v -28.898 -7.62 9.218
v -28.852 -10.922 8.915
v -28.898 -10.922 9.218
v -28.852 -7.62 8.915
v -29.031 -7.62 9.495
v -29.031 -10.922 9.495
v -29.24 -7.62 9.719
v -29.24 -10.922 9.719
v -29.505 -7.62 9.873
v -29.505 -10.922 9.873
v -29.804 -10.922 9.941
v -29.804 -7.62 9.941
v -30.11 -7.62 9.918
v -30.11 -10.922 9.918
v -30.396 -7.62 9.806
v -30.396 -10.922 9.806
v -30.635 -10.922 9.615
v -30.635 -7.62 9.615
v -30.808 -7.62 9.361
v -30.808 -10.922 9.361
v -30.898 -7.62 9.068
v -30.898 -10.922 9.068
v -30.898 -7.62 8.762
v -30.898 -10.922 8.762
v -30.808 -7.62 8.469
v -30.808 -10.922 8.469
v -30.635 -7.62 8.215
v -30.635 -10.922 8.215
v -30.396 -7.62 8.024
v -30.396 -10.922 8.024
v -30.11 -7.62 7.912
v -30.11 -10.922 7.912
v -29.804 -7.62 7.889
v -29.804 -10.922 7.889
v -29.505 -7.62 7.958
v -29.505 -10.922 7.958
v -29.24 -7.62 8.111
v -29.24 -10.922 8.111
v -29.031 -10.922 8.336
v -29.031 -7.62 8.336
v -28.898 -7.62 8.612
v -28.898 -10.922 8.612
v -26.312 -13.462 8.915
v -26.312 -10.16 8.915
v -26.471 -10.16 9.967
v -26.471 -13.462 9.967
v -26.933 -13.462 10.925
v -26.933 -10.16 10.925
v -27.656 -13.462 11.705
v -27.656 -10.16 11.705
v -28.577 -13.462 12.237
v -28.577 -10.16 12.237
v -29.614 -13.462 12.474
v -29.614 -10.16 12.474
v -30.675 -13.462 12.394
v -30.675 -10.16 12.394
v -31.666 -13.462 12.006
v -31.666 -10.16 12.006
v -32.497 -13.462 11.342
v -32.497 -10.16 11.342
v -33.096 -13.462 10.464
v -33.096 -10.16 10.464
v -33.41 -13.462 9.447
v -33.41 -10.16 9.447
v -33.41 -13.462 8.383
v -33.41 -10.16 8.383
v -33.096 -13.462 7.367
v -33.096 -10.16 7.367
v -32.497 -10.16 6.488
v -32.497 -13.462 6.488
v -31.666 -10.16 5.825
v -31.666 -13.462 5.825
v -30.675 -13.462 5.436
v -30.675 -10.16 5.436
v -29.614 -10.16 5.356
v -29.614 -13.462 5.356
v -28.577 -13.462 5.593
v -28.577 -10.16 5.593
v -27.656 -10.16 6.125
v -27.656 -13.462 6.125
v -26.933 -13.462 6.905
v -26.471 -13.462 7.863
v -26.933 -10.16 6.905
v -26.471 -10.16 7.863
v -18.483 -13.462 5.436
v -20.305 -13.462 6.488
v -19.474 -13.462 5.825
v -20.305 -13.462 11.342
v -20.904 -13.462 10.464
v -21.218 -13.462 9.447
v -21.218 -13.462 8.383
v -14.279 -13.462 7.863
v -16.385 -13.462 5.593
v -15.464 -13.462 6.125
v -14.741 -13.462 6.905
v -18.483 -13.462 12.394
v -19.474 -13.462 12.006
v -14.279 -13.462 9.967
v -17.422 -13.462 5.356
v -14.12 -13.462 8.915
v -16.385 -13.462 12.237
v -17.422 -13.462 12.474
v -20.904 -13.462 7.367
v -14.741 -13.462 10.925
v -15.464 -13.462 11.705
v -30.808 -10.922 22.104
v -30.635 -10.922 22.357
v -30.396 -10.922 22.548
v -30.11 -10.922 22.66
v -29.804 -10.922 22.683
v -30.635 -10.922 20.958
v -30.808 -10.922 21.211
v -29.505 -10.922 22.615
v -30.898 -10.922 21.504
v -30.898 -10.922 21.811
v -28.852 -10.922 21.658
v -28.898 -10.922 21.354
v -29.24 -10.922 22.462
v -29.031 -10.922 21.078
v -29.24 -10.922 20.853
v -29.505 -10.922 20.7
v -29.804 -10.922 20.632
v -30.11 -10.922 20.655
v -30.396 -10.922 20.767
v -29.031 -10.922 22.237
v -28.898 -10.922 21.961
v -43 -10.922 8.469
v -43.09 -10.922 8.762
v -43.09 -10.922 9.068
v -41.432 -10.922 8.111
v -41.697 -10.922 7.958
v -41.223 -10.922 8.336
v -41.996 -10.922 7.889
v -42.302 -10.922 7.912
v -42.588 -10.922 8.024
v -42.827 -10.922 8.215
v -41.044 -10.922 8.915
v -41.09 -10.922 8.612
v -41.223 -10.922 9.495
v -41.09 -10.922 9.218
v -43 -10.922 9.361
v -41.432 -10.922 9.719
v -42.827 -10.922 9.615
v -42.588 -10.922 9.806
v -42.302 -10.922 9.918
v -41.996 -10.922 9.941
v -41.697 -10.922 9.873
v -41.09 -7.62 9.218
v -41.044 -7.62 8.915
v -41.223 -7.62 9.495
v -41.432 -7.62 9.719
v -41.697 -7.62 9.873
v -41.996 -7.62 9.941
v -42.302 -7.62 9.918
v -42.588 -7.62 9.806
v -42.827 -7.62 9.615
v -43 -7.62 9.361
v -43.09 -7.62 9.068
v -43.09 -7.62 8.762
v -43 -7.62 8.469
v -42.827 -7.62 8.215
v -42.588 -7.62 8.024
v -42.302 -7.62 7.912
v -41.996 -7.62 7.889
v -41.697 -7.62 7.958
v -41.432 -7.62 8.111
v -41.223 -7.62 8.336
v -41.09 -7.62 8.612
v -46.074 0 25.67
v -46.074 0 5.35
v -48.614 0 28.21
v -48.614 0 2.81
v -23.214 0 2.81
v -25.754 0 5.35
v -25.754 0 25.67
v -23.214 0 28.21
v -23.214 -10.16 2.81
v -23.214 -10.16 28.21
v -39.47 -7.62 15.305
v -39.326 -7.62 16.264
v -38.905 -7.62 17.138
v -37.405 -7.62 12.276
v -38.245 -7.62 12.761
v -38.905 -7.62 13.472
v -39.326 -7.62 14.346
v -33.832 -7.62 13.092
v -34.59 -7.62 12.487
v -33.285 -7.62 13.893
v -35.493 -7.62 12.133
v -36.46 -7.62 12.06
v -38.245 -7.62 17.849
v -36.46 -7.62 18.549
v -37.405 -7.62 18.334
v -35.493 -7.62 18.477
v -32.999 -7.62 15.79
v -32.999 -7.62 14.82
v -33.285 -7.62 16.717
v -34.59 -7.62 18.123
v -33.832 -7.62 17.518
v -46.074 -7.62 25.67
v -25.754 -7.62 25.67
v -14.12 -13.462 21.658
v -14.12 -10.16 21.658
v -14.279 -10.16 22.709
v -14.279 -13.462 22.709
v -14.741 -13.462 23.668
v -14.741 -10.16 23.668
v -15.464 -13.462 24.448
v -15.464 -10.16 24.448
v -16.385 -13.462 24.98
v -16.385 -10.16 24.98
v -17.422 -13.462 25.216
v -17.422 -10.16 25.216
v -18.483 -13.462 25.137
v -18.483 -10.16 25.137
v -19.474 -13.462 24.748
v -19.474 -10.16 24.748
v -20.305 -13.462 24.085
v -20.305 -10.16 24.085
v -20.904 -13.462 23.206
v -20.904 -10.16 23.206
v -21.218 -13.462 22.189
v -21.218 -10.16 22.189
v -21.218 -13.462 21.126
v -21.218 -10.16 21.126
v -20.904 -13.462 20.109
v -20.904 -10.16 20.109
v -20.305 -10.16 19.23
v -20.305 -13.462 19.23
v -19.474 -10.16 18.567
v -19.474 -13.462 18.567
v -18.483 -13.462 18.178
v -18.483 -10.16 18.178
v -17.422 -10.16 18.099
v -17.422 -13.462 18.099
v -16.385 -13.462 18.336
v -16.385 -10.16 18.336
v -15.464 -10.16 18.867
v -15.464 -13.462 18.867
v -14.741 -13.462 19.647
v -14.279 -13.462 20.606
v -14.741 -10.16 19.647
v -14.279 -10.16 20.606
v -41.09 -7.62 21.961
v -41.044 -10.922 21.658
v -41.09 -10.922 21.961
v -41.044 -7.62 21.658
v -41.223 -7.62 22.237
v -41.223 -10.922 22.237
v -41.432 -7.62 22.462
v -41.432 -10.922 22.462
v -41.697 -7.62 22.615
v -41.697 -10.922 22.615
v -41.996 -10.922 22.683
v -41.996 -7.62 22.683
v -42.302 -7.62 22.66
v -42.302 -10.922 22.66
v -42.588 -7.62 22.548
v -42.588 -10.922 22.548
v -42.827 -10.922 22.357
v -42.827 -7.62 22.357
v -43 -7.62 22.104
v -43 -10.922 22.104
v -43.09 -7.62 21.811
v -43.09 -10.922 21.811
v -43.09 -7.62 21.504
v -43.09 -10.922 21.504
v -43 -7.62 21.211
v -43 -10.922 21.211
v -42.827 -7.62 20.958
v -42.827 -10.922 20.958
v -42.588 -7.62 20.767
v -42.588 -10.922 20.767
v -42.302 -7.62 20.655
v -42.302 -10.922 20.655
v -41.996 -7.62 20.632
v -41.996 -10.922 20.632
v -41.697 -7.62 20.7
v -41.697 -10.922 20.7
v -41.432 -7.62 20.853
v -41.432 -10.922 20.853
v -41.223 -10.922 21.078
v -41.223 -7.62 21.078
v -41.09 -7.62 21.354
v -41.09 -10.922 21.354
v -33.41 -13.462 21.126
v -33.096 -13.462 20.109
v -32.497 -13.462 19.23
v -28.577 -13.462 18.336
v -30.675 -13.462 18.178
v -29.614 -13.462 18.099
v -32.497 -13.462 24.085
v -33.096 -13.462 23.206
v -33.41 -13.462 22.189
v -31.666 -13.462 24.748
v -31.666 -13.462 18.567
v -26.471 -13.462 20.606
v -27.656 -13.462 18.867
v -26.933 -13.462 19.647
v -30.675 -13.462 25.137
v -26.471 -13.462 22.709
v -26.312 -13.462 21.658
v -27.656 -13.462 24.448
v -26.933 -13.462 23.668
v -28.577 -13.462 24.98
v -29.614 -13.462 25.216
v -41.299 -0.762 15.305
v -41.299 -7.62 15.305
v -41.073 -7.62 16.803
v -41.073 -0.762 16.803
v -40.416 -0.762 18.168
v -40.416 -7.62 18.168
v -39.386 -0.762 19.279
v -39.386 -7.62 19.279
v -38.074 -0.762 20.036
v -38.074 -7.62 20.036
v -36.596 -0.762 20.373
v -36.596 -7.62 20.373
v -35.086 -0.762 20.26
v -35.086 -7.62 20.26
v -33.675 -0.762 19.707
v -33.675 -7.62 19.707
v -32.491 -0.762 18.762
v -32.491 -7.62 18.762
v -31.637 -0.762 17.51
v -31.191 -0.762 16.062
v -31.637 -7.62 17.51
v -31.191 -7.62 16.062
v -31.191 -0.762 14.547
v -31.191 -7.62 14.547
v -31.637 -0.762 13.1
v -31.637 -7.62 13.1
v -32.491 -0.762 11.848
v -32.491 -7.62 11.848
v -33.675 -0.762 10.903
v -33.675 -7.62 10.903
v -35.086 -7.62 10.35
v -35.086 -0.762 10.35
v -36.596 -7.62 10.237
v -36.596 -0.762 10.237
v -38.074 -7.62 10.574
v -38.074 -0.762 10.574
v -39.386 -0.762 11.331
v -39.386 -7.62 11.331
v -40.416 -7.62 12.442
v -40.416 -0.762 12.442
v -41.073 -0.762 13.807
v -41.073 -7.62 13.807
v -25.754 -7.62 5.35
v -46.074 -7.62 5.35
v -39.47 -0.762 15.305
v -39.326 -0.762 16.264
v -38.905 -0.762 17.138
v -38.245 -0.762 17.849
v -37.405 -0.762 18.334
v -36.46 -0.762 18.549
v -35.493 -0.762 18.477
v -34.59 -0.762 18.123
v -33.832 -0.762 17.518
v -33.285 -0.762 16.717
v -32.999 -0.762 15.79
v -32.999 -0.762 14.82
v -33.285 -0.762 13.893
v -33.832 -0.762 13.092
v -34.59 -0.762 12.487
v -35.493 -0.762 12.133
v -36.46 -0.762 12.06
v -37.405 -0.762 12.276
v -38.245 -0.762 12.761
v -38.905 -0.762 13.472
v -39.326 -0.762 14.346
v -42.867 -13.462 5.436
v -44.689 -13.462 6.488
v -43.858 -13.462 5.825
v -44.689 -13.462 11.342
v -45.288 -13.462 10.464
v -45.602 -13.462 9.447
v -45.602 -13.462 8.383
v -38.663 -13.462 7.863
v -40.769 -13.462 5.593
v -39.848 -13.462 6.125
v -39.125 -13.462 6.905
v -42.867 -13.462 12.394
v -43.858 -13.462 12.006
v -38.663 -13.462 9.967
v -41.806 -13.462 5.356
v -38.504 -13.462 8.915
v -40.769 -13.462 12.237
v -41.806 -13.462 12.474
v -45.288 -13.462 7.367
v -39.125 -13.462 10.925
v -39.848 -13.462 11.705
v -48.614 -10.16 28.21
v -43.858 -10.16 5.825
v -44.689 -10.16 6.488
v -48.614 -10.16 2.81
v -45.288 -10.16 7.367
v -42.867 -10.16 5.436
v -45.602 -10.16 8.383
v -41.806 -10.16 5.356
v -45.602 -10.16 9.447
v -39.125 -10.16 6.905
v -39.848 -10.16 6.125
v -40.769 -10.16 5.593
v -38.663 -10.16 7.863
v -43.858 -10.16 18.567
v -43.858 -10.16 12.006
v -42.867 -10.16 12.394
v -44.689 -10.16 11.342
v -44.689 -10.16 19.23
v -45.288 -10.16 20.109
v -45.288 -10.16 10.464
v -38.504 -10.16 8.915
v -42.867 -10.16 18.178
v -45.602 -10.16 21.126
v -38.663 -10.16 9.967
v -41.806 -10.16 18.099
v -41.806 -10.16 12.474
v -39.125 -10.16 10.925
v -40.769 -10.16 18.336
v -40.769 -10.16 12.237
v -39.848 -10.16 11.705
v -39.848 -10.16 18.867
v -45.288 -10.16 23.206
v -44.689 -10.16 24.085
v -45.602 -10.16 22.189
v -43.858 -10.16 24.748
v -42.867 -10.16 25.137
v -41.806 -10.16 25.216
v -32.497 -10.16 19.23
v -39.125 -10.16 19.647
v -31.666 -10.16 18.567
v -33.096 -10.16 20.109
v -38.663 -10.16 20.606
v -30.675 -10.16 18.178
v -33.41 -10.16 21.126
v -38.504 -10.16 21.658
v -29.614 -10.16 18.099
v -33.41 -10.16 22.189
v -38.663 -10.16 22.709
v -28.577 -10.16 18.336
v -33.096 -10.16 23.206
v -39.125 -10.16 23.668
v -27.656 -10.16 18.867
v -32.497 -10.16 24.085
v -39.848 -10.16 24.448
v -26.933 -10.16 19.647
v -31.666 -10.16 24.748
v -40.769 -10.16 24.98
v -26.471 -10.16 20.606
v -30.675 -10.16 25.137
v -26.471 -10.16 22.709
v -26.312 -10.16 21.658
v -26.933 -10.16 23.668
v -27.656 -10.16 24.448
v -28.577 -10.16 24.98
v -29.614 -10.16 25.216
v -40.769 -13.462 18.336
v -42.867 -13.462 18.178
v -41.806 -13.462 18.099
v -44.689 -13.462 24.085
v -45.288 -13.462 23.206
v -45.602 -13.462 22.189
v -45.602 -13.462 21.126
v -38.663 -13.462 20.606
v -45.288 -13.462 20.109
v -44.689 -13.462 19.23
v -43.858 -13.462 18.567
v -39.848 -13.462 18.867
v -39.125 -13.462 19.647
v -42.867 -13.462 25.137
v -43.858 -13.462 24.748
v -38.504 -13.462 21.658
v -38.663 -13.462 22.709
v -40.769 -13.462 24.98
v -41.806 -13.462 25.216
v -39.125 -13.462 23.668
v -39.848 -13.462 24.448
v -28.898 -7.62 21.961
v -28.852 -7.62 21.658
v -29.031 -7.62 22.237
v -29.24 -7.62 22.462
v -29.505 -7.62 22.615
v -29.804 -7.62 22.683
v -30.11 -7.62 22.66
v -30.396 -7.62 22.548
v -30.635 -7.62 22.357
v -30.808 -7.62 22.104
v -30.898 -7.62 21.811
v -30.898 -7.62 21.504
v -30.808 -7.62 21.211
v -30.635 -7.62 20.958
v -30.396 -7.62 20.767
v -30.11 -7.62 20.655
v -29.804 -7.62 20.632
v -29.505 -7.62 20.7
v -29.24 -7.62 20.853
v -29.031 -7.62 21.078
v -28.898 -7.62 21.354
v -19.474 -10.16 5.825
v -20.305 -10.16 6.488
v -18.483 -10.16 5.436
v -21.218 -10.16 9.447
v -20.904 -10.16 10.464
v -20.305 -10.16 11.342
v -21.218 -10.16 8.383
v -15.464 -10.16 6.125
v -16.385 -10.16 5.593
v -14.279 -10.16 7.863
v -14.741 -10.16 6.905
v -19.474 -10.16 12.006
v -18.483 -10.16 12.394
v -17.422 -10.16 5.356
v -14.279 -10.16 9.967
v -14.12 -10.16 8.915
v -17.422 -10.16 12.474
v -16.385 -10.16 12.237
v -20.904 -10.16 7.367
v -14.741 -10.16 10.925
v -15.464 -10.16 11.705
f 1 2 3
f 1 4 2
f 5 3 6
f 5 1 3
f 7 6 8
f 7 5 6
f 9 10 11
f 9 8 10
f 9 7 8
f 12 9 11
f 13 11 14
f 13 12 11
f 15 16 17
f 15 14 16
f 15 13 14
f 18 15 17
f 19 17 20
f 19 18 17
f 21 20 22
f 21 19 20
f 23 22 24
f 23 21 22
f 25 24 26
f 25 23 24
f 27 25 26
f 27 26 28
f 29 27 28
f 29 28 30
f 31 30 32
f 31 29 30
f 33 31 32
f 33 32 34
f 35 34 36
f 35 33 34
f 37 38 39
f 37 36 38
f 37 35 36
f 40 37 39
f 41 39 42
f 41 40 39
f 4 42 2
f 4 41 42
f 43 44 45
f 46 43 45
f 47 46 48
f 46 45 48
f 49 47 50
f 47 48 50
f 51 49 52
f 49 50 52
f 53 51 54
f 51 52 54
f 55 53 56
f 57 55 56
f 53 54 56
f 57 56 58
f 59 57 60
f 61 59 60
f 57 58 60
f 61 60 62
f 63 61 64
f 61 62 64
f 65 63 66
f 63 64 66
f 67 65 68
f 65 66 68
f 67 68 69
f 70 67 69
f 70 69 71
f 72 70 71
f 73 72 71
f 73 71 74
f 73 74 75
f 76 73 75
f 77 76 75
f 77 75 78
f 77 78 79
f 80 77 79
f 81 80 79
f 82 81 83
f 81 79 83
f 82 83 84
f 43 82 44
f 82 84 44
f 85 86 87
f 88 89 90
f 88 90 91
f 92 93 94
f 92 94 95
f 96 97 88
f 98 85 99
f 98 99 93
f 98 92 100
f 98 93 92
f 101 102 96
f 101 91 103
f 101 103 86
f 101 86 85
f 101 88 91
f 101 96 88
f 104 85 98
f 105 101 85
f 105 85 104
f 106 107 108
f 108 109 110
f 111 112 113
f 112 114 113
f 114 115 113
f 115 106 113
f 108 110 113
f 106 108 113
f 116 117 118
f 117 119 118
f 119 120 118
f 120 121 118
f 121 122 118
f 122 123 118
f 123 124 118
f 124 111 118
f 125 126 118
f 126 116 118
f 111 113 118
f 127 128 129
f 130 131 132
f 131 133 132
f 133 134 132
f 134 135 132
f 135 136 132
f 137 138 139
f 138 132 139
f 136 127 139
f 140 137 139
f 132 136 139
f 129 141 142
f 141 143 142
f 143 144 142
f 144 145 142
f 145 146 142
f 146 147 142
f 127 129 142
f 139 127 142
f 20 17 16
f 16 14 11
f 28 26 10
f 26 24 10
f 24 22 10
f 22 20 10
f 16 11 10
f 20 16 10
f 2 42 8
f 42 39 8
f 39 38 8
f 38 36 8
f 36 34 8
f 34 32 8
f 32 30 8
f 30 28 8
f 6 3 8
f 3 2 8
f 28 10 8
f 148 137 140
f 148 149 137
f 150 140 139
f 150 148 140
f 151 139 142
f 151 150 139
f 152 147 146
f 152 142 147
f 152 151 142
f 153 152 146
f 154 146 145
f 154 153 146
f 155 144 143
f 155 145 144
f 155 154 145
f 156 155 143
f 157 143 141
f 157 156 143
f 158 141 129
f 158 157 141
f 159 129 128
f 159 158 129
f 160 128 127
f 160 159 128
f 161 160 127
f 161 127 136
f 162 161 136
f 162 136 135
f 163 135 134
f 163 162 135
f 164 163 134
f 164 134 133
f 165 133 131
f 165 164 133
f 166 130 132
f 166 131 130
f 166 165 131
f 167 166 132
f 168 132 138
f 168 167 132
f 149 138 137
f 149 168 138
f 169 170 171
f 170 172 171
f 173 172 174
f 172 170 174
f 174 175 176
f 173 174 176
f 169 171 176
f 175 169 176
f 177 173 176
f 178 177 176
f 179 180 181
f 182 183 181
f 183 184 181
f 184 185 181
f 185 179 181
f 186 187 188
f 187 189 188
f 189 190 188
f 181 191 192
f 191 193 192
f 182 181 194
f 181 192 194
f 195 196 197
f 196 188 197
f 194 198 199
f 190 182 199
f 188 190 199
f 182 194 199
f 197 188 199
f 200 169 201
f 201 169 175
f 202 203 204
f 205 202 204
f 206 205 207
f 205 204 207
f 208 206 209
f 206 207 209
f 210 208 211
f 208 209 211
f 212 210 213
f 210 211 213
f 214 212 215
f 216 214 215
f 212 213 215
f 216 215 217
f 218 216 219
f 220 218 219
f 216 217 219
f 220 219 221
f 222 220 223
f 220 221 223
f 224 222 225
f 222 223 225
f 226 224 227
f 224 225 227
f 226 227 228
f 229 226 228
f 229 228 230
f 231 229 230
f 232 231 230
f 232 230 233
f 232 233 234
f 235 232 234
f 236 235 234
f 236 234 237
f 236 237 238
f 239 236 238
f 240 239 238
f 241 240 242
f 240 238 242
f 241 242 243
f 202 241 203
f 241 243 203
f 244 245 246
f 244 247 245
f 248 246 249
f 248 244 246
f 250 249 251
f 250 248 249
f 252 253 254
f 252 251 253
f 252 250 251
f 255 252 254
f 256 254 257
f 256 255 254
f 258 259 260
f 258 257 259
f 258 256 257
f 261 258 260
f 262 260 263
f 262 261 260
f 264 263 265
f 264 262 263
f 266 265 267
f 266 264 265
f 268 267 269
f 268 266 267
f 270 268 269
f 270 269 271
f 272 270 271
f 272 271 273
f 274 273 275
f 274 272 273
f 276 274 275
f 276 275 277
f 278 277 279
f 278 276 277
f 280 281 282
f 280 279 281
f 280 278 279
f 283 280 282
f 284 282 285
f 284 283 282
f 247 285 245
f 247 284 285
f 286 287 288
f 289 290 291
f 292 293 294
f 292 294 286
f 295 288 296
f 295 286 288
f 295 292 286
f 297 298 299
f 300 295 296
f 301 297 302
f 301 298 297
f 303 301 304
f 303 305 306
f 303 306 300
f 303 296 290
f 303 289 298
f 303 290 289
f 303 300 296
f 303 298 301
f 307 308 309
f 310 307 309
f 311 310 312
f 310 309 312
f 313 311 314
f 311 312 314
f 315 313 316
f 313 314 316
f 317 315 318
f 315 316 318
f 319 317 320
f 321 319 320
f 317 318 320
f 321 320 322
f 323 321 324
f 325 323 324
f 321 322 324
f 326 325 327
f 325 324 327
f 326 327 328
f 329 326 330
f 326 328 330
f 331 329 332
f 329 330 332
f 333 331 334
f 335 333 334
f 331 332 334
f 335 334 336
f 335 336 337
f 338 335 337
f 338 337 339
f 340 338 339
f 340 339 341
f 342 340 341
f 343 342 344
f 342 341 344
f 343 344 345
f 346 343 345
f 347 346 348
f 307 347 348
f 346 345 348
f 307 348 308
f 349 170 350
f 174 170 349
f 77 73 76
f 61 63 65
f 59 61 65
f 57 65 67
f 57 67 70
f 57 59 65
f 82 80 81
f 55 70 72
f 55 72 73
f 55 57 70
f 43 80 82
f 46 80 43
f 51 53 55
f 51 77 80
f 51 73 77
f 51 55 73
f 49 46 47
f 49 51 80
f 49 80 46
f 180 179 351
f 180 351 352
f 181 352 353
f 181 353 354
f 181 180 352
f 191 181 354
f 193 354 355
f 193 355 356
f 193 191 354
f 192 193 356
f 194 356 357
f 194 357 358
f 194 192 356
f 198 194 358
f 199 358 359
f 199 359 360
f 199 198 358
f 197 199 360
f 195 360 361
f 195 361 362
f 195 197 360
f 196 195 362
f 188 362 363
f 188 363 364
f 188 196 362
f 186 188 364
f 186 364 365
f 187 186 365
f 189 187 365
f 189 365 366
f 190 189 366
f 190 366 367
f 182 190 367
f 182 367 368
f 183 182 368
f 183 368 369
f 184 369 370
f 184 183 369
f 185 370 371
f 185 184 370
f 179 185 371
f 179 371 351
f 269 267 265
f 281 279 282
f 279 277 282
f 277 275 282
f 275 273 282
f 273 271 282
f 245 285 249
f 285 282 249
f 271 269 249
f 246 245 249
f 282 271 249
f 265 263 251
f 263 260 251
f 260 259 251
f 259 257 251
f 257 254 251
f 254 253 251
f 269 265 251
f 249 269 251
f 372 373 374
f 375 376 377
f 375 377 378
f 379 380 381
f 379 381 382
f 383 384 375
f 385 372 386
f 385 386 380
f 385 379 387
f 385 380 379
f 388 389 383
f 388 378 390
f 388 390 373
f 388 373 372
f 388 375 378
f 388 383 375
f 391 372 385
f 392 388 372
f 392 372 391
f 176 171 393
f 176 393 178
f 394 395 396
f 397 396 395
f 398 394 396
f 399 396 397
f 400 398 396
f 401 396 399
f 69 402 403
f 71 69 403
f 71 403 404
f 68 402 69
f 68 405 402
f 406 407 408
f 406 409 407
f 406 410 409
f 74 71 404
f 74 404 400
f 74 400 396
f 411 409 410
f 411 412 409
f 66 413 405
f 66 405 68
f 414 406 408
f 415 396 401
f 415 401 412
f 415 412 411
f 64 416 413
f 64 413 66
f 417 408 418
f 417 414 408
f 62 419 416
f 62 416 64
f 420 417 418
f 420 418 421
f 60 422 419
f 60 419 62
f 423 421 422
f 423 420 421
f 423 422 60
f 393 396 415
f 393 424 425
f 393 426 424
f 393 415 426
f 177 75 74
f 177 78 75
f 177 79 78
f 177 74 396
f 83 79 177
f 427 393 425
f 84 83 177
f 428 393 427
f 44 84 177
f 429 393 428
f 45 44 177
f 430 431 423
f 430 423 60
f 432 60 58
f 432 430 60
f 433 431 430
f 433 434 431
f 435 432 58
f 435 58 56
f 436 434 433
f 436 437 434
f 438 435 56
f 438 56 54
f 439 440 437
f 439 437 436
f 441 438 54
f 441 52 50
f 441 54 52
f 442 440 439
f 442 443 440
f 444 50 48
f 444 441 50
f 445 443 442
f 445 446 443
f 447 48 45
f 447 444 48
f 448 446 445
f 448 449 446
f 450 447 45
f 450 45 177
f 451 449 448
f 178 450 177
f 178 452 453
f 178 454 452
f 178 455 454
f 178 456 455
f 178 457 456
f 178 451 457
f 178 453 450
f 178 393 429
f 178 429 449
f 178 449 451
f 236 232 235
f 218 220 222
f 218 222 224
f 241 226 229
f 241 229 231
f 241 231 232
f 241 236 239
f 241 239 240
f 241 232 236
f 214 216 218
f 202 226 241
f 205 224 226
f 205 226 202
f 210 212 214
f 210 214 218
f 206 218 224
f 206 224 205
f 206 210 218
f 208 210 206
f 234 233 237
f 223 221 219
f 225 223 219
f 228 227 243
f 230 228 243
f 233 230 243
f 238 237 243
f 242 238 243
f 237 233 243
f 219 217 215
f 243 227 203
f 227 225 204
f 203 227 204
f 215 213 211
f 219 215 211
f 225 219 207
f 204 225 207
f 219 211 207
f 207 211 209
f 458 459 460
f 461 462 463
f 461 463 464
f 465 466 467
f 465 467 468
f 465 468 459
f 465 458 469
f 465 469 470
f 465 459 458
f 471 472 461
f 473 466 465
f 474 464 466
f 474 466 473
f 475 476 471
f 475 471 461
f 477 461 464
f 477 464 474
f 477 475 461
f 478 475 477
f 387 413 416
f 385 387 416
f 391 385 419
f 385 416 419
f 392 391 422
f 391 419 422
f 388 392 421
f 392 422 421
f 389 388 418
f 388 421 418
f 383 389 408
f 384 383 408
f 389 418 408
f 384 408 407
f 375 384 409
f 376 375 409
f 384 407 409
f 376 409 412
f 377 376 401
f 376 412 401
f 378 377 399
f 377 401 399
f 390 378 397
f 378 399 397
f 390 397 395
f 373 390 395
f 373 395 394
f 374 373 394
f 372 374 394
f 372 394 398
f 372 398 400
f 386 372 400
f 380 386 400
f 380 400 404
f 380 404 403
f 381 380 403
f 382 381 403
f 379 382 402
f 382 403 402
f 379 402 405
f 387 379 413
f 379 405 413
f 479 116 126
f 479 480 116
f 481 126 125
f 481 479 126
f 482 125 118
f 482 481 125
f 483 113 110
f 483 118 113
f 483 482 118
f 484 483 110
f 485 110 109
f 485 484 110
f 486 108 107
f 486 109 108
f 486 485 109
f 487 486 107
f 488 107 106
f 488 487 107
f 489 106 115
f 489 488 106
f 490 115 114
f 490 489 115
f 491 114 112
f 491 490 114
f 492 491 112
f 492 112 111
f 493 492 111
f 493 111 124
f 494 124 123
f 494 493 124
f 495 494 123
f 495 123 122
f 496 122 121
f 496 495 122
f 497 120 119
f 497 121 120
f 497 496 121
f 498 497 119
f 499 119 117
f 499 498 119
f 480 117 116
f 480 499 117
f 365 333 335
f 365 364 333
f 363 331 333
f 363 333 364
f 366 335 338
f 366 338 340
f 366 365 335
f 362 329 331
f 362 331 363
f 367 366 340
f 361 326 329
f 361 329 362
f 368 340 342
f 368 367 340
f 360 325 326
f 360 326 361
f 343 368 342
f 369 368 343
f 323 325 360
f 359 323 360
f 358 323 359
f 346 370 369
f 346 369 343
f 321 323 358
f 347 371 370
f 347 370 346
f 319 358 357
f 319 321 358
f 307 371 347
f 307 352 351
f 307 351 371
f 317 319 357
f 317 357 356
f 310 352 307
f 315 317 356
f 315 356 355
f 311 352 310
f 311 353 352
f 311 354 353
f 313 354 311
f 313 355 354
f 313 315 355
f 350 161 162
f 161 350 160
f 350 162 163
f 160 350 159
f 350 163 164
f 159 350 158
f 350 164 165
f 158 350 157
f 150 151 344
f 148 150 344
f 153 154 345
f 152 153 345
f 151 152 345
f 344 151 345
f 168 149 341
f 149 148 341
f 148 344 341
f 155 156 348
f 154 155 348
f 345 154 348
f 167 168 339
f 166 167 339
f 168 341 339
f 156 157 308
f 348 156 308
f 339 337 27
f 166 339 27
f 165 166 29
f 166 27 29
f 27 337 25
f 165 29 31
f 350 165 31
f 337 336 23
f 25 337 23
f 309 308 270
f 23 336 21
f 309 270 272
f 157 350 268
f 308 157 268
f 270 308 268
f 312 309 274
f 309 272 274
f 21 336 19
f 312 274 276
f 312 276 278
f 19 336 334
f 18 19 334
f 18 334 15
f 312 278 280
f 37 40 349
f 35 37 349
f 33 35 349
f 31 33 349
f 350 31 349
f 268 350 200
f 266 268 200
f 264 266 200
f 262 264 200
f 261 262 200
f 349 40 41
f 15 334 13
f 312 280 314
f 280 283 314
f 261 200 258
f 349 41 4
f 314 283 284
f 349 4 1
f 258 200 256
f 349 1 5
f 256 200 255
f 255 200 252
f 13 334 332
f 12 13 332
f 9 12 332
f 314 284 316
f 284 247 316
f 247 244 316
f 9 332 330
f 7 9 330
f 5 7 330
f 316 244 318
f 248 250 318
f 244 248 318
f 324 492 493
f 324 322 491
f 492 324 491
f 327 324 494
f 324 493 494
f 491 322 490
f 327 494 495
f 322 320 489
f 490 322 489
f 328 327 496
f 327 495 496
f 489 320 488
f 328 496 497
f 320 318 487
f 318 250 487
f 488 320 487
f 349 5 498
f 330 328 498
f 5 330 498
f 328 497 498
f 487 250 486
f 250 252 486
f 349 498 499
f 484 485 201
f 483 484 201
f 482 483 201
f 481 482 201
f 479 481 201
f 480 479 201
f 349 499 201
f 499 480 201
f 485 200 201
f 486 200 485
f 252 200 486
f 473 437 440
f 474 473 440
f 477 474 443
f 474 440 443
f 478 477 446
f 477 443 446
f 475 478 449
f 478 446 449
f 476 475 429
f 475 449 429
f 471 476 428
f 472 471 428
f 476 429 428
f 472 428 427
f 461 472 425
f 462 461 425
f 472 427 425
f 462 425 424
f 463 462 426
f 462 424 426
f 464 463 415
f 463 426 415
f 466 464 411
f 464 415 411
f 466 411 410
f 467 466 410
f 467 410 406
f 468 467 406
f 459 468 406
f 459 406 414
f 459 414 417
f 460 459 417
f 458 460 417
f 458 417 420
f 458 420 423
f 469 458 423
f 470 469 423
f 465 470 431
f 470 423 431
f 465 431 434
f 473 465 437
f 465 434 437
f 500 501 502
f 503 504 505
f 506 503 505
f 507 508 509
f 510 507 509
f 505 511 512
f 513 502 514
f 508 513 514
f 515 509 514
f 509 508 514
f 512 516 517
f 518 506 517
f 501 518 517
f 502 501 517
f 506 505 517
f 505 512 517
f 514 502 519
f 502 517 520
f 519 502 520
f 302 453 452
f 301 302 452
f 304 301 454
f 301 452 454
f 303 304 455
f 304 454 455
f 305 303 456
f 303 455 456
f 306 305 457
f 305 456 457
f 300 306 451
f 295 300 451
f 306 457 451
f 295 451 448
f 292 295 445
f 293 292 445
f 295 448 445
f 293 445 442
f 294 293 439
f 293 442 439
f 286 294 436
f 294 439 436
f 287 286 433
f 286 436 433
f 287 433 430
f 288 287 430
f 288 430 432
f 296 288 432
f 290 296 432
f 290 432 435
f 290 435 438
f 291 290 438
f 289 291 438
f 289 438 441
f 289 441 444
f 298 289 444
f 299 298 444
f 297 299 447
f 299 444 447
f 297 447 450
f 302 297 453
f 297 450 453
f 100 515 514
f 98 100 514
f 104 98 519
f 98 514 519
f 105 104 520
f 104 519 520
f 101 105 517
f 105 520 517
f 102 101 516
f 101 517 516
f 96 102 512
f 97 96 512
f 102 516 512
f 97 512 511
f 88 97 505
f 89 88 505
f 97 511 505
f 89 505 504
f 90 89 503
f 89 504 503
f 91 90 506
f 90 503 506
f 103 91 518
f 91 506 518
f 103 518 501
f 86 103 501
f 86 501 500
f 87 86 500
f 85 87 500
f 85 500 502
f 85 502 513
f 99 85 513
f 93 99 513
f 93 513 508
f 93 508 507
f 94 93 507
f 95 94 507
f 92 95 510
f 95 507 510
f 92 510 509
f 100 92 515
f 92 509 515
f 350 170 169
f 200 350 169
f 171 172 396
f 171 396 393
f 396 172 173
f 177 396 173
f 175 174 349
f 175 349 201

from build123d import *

# Parameters (mm, degrees)
F0_W     = 25.4
F0_H     = 25.4
F1_DEPTH = 10.16
F2_R     = 3.5687
F3_DEPTH = 3.302
F4_T     = -2.54
F5_R     = 5.0826092398
F5_R_2   = 3.2535750666
F6_DEPTH = 6.858


with BuildPart() as f1:
    # F0 (on Front) → F1 (new body)
    with BuildSketch(Plane.XZ):
        with Locations((-35.9135796316, 15.5098860579)):
            Rectangle(F0_W, F0_H)
    extrude(amount=F1_DEPTH)

    # F2 (on face) → F3 (join)
    with BuildSketch(Plane.XZ.offset(10.16)):
        with Locations((-42.0731604099, 21.6575805098)):
            Circle(F2_R)
        with Locations((-42.0731604099, 8.915132843)):
            Circle(F2_R)
        with Locations((-29.8811604099, 21.6575805098)):
            Circle(F2_R)
        with Locations((-29.8811604099, 8.915132843)):
            Circle(F2_R)
    extrude(amount=F3_DEPTH)

    # F4
    f4_openings = [f1.faces().sort_by_distance(p)[0] for p in [
        (-35.91358, 0, 15.509886),
    ]]
    offset(amount=F4_T, openings=f4_openings, kind=Kind.INTERSECTION)

    # F5 (on face) → F6 (join)
    with BuildSketch(Plane(origin=(0, -7.62, 0), x_dir=(-1, 0, 0), z_dir=(0, 1, 0))):
        with Locations((36.2166501582, 15.3049435467)):
            Circle(F5_R)
        with Locations((36.2166501582, 15.3049435467)):
            Circle(F5_R_2, mode=Mode.SUBTRACT)
    extrude(amount=F6_DEPTH)


with BuildPart() as f3:
    # F2 (on face) → F3, piece 2 (new body)
    with BuildSketch(Plane.XZ.offset(10.16)):
        with Locations((-17.6891604099, 21.6575805098)):
            Circle(F2_R)
    extrude(amount=F3_DEPTH)


with BuildPart() as f3b:
    # F2 (on face) → F3, piece 3 (new body)
    with BuildSketch(Plane.XZ.offset(10.16)):
        with Locations((-17.6891604099, 8.915132843)):
            Circle(F2_R)
    extrude(amount=F3_DEPTH)


solid = Compound([f1.part, f3.part, f3b.part])
